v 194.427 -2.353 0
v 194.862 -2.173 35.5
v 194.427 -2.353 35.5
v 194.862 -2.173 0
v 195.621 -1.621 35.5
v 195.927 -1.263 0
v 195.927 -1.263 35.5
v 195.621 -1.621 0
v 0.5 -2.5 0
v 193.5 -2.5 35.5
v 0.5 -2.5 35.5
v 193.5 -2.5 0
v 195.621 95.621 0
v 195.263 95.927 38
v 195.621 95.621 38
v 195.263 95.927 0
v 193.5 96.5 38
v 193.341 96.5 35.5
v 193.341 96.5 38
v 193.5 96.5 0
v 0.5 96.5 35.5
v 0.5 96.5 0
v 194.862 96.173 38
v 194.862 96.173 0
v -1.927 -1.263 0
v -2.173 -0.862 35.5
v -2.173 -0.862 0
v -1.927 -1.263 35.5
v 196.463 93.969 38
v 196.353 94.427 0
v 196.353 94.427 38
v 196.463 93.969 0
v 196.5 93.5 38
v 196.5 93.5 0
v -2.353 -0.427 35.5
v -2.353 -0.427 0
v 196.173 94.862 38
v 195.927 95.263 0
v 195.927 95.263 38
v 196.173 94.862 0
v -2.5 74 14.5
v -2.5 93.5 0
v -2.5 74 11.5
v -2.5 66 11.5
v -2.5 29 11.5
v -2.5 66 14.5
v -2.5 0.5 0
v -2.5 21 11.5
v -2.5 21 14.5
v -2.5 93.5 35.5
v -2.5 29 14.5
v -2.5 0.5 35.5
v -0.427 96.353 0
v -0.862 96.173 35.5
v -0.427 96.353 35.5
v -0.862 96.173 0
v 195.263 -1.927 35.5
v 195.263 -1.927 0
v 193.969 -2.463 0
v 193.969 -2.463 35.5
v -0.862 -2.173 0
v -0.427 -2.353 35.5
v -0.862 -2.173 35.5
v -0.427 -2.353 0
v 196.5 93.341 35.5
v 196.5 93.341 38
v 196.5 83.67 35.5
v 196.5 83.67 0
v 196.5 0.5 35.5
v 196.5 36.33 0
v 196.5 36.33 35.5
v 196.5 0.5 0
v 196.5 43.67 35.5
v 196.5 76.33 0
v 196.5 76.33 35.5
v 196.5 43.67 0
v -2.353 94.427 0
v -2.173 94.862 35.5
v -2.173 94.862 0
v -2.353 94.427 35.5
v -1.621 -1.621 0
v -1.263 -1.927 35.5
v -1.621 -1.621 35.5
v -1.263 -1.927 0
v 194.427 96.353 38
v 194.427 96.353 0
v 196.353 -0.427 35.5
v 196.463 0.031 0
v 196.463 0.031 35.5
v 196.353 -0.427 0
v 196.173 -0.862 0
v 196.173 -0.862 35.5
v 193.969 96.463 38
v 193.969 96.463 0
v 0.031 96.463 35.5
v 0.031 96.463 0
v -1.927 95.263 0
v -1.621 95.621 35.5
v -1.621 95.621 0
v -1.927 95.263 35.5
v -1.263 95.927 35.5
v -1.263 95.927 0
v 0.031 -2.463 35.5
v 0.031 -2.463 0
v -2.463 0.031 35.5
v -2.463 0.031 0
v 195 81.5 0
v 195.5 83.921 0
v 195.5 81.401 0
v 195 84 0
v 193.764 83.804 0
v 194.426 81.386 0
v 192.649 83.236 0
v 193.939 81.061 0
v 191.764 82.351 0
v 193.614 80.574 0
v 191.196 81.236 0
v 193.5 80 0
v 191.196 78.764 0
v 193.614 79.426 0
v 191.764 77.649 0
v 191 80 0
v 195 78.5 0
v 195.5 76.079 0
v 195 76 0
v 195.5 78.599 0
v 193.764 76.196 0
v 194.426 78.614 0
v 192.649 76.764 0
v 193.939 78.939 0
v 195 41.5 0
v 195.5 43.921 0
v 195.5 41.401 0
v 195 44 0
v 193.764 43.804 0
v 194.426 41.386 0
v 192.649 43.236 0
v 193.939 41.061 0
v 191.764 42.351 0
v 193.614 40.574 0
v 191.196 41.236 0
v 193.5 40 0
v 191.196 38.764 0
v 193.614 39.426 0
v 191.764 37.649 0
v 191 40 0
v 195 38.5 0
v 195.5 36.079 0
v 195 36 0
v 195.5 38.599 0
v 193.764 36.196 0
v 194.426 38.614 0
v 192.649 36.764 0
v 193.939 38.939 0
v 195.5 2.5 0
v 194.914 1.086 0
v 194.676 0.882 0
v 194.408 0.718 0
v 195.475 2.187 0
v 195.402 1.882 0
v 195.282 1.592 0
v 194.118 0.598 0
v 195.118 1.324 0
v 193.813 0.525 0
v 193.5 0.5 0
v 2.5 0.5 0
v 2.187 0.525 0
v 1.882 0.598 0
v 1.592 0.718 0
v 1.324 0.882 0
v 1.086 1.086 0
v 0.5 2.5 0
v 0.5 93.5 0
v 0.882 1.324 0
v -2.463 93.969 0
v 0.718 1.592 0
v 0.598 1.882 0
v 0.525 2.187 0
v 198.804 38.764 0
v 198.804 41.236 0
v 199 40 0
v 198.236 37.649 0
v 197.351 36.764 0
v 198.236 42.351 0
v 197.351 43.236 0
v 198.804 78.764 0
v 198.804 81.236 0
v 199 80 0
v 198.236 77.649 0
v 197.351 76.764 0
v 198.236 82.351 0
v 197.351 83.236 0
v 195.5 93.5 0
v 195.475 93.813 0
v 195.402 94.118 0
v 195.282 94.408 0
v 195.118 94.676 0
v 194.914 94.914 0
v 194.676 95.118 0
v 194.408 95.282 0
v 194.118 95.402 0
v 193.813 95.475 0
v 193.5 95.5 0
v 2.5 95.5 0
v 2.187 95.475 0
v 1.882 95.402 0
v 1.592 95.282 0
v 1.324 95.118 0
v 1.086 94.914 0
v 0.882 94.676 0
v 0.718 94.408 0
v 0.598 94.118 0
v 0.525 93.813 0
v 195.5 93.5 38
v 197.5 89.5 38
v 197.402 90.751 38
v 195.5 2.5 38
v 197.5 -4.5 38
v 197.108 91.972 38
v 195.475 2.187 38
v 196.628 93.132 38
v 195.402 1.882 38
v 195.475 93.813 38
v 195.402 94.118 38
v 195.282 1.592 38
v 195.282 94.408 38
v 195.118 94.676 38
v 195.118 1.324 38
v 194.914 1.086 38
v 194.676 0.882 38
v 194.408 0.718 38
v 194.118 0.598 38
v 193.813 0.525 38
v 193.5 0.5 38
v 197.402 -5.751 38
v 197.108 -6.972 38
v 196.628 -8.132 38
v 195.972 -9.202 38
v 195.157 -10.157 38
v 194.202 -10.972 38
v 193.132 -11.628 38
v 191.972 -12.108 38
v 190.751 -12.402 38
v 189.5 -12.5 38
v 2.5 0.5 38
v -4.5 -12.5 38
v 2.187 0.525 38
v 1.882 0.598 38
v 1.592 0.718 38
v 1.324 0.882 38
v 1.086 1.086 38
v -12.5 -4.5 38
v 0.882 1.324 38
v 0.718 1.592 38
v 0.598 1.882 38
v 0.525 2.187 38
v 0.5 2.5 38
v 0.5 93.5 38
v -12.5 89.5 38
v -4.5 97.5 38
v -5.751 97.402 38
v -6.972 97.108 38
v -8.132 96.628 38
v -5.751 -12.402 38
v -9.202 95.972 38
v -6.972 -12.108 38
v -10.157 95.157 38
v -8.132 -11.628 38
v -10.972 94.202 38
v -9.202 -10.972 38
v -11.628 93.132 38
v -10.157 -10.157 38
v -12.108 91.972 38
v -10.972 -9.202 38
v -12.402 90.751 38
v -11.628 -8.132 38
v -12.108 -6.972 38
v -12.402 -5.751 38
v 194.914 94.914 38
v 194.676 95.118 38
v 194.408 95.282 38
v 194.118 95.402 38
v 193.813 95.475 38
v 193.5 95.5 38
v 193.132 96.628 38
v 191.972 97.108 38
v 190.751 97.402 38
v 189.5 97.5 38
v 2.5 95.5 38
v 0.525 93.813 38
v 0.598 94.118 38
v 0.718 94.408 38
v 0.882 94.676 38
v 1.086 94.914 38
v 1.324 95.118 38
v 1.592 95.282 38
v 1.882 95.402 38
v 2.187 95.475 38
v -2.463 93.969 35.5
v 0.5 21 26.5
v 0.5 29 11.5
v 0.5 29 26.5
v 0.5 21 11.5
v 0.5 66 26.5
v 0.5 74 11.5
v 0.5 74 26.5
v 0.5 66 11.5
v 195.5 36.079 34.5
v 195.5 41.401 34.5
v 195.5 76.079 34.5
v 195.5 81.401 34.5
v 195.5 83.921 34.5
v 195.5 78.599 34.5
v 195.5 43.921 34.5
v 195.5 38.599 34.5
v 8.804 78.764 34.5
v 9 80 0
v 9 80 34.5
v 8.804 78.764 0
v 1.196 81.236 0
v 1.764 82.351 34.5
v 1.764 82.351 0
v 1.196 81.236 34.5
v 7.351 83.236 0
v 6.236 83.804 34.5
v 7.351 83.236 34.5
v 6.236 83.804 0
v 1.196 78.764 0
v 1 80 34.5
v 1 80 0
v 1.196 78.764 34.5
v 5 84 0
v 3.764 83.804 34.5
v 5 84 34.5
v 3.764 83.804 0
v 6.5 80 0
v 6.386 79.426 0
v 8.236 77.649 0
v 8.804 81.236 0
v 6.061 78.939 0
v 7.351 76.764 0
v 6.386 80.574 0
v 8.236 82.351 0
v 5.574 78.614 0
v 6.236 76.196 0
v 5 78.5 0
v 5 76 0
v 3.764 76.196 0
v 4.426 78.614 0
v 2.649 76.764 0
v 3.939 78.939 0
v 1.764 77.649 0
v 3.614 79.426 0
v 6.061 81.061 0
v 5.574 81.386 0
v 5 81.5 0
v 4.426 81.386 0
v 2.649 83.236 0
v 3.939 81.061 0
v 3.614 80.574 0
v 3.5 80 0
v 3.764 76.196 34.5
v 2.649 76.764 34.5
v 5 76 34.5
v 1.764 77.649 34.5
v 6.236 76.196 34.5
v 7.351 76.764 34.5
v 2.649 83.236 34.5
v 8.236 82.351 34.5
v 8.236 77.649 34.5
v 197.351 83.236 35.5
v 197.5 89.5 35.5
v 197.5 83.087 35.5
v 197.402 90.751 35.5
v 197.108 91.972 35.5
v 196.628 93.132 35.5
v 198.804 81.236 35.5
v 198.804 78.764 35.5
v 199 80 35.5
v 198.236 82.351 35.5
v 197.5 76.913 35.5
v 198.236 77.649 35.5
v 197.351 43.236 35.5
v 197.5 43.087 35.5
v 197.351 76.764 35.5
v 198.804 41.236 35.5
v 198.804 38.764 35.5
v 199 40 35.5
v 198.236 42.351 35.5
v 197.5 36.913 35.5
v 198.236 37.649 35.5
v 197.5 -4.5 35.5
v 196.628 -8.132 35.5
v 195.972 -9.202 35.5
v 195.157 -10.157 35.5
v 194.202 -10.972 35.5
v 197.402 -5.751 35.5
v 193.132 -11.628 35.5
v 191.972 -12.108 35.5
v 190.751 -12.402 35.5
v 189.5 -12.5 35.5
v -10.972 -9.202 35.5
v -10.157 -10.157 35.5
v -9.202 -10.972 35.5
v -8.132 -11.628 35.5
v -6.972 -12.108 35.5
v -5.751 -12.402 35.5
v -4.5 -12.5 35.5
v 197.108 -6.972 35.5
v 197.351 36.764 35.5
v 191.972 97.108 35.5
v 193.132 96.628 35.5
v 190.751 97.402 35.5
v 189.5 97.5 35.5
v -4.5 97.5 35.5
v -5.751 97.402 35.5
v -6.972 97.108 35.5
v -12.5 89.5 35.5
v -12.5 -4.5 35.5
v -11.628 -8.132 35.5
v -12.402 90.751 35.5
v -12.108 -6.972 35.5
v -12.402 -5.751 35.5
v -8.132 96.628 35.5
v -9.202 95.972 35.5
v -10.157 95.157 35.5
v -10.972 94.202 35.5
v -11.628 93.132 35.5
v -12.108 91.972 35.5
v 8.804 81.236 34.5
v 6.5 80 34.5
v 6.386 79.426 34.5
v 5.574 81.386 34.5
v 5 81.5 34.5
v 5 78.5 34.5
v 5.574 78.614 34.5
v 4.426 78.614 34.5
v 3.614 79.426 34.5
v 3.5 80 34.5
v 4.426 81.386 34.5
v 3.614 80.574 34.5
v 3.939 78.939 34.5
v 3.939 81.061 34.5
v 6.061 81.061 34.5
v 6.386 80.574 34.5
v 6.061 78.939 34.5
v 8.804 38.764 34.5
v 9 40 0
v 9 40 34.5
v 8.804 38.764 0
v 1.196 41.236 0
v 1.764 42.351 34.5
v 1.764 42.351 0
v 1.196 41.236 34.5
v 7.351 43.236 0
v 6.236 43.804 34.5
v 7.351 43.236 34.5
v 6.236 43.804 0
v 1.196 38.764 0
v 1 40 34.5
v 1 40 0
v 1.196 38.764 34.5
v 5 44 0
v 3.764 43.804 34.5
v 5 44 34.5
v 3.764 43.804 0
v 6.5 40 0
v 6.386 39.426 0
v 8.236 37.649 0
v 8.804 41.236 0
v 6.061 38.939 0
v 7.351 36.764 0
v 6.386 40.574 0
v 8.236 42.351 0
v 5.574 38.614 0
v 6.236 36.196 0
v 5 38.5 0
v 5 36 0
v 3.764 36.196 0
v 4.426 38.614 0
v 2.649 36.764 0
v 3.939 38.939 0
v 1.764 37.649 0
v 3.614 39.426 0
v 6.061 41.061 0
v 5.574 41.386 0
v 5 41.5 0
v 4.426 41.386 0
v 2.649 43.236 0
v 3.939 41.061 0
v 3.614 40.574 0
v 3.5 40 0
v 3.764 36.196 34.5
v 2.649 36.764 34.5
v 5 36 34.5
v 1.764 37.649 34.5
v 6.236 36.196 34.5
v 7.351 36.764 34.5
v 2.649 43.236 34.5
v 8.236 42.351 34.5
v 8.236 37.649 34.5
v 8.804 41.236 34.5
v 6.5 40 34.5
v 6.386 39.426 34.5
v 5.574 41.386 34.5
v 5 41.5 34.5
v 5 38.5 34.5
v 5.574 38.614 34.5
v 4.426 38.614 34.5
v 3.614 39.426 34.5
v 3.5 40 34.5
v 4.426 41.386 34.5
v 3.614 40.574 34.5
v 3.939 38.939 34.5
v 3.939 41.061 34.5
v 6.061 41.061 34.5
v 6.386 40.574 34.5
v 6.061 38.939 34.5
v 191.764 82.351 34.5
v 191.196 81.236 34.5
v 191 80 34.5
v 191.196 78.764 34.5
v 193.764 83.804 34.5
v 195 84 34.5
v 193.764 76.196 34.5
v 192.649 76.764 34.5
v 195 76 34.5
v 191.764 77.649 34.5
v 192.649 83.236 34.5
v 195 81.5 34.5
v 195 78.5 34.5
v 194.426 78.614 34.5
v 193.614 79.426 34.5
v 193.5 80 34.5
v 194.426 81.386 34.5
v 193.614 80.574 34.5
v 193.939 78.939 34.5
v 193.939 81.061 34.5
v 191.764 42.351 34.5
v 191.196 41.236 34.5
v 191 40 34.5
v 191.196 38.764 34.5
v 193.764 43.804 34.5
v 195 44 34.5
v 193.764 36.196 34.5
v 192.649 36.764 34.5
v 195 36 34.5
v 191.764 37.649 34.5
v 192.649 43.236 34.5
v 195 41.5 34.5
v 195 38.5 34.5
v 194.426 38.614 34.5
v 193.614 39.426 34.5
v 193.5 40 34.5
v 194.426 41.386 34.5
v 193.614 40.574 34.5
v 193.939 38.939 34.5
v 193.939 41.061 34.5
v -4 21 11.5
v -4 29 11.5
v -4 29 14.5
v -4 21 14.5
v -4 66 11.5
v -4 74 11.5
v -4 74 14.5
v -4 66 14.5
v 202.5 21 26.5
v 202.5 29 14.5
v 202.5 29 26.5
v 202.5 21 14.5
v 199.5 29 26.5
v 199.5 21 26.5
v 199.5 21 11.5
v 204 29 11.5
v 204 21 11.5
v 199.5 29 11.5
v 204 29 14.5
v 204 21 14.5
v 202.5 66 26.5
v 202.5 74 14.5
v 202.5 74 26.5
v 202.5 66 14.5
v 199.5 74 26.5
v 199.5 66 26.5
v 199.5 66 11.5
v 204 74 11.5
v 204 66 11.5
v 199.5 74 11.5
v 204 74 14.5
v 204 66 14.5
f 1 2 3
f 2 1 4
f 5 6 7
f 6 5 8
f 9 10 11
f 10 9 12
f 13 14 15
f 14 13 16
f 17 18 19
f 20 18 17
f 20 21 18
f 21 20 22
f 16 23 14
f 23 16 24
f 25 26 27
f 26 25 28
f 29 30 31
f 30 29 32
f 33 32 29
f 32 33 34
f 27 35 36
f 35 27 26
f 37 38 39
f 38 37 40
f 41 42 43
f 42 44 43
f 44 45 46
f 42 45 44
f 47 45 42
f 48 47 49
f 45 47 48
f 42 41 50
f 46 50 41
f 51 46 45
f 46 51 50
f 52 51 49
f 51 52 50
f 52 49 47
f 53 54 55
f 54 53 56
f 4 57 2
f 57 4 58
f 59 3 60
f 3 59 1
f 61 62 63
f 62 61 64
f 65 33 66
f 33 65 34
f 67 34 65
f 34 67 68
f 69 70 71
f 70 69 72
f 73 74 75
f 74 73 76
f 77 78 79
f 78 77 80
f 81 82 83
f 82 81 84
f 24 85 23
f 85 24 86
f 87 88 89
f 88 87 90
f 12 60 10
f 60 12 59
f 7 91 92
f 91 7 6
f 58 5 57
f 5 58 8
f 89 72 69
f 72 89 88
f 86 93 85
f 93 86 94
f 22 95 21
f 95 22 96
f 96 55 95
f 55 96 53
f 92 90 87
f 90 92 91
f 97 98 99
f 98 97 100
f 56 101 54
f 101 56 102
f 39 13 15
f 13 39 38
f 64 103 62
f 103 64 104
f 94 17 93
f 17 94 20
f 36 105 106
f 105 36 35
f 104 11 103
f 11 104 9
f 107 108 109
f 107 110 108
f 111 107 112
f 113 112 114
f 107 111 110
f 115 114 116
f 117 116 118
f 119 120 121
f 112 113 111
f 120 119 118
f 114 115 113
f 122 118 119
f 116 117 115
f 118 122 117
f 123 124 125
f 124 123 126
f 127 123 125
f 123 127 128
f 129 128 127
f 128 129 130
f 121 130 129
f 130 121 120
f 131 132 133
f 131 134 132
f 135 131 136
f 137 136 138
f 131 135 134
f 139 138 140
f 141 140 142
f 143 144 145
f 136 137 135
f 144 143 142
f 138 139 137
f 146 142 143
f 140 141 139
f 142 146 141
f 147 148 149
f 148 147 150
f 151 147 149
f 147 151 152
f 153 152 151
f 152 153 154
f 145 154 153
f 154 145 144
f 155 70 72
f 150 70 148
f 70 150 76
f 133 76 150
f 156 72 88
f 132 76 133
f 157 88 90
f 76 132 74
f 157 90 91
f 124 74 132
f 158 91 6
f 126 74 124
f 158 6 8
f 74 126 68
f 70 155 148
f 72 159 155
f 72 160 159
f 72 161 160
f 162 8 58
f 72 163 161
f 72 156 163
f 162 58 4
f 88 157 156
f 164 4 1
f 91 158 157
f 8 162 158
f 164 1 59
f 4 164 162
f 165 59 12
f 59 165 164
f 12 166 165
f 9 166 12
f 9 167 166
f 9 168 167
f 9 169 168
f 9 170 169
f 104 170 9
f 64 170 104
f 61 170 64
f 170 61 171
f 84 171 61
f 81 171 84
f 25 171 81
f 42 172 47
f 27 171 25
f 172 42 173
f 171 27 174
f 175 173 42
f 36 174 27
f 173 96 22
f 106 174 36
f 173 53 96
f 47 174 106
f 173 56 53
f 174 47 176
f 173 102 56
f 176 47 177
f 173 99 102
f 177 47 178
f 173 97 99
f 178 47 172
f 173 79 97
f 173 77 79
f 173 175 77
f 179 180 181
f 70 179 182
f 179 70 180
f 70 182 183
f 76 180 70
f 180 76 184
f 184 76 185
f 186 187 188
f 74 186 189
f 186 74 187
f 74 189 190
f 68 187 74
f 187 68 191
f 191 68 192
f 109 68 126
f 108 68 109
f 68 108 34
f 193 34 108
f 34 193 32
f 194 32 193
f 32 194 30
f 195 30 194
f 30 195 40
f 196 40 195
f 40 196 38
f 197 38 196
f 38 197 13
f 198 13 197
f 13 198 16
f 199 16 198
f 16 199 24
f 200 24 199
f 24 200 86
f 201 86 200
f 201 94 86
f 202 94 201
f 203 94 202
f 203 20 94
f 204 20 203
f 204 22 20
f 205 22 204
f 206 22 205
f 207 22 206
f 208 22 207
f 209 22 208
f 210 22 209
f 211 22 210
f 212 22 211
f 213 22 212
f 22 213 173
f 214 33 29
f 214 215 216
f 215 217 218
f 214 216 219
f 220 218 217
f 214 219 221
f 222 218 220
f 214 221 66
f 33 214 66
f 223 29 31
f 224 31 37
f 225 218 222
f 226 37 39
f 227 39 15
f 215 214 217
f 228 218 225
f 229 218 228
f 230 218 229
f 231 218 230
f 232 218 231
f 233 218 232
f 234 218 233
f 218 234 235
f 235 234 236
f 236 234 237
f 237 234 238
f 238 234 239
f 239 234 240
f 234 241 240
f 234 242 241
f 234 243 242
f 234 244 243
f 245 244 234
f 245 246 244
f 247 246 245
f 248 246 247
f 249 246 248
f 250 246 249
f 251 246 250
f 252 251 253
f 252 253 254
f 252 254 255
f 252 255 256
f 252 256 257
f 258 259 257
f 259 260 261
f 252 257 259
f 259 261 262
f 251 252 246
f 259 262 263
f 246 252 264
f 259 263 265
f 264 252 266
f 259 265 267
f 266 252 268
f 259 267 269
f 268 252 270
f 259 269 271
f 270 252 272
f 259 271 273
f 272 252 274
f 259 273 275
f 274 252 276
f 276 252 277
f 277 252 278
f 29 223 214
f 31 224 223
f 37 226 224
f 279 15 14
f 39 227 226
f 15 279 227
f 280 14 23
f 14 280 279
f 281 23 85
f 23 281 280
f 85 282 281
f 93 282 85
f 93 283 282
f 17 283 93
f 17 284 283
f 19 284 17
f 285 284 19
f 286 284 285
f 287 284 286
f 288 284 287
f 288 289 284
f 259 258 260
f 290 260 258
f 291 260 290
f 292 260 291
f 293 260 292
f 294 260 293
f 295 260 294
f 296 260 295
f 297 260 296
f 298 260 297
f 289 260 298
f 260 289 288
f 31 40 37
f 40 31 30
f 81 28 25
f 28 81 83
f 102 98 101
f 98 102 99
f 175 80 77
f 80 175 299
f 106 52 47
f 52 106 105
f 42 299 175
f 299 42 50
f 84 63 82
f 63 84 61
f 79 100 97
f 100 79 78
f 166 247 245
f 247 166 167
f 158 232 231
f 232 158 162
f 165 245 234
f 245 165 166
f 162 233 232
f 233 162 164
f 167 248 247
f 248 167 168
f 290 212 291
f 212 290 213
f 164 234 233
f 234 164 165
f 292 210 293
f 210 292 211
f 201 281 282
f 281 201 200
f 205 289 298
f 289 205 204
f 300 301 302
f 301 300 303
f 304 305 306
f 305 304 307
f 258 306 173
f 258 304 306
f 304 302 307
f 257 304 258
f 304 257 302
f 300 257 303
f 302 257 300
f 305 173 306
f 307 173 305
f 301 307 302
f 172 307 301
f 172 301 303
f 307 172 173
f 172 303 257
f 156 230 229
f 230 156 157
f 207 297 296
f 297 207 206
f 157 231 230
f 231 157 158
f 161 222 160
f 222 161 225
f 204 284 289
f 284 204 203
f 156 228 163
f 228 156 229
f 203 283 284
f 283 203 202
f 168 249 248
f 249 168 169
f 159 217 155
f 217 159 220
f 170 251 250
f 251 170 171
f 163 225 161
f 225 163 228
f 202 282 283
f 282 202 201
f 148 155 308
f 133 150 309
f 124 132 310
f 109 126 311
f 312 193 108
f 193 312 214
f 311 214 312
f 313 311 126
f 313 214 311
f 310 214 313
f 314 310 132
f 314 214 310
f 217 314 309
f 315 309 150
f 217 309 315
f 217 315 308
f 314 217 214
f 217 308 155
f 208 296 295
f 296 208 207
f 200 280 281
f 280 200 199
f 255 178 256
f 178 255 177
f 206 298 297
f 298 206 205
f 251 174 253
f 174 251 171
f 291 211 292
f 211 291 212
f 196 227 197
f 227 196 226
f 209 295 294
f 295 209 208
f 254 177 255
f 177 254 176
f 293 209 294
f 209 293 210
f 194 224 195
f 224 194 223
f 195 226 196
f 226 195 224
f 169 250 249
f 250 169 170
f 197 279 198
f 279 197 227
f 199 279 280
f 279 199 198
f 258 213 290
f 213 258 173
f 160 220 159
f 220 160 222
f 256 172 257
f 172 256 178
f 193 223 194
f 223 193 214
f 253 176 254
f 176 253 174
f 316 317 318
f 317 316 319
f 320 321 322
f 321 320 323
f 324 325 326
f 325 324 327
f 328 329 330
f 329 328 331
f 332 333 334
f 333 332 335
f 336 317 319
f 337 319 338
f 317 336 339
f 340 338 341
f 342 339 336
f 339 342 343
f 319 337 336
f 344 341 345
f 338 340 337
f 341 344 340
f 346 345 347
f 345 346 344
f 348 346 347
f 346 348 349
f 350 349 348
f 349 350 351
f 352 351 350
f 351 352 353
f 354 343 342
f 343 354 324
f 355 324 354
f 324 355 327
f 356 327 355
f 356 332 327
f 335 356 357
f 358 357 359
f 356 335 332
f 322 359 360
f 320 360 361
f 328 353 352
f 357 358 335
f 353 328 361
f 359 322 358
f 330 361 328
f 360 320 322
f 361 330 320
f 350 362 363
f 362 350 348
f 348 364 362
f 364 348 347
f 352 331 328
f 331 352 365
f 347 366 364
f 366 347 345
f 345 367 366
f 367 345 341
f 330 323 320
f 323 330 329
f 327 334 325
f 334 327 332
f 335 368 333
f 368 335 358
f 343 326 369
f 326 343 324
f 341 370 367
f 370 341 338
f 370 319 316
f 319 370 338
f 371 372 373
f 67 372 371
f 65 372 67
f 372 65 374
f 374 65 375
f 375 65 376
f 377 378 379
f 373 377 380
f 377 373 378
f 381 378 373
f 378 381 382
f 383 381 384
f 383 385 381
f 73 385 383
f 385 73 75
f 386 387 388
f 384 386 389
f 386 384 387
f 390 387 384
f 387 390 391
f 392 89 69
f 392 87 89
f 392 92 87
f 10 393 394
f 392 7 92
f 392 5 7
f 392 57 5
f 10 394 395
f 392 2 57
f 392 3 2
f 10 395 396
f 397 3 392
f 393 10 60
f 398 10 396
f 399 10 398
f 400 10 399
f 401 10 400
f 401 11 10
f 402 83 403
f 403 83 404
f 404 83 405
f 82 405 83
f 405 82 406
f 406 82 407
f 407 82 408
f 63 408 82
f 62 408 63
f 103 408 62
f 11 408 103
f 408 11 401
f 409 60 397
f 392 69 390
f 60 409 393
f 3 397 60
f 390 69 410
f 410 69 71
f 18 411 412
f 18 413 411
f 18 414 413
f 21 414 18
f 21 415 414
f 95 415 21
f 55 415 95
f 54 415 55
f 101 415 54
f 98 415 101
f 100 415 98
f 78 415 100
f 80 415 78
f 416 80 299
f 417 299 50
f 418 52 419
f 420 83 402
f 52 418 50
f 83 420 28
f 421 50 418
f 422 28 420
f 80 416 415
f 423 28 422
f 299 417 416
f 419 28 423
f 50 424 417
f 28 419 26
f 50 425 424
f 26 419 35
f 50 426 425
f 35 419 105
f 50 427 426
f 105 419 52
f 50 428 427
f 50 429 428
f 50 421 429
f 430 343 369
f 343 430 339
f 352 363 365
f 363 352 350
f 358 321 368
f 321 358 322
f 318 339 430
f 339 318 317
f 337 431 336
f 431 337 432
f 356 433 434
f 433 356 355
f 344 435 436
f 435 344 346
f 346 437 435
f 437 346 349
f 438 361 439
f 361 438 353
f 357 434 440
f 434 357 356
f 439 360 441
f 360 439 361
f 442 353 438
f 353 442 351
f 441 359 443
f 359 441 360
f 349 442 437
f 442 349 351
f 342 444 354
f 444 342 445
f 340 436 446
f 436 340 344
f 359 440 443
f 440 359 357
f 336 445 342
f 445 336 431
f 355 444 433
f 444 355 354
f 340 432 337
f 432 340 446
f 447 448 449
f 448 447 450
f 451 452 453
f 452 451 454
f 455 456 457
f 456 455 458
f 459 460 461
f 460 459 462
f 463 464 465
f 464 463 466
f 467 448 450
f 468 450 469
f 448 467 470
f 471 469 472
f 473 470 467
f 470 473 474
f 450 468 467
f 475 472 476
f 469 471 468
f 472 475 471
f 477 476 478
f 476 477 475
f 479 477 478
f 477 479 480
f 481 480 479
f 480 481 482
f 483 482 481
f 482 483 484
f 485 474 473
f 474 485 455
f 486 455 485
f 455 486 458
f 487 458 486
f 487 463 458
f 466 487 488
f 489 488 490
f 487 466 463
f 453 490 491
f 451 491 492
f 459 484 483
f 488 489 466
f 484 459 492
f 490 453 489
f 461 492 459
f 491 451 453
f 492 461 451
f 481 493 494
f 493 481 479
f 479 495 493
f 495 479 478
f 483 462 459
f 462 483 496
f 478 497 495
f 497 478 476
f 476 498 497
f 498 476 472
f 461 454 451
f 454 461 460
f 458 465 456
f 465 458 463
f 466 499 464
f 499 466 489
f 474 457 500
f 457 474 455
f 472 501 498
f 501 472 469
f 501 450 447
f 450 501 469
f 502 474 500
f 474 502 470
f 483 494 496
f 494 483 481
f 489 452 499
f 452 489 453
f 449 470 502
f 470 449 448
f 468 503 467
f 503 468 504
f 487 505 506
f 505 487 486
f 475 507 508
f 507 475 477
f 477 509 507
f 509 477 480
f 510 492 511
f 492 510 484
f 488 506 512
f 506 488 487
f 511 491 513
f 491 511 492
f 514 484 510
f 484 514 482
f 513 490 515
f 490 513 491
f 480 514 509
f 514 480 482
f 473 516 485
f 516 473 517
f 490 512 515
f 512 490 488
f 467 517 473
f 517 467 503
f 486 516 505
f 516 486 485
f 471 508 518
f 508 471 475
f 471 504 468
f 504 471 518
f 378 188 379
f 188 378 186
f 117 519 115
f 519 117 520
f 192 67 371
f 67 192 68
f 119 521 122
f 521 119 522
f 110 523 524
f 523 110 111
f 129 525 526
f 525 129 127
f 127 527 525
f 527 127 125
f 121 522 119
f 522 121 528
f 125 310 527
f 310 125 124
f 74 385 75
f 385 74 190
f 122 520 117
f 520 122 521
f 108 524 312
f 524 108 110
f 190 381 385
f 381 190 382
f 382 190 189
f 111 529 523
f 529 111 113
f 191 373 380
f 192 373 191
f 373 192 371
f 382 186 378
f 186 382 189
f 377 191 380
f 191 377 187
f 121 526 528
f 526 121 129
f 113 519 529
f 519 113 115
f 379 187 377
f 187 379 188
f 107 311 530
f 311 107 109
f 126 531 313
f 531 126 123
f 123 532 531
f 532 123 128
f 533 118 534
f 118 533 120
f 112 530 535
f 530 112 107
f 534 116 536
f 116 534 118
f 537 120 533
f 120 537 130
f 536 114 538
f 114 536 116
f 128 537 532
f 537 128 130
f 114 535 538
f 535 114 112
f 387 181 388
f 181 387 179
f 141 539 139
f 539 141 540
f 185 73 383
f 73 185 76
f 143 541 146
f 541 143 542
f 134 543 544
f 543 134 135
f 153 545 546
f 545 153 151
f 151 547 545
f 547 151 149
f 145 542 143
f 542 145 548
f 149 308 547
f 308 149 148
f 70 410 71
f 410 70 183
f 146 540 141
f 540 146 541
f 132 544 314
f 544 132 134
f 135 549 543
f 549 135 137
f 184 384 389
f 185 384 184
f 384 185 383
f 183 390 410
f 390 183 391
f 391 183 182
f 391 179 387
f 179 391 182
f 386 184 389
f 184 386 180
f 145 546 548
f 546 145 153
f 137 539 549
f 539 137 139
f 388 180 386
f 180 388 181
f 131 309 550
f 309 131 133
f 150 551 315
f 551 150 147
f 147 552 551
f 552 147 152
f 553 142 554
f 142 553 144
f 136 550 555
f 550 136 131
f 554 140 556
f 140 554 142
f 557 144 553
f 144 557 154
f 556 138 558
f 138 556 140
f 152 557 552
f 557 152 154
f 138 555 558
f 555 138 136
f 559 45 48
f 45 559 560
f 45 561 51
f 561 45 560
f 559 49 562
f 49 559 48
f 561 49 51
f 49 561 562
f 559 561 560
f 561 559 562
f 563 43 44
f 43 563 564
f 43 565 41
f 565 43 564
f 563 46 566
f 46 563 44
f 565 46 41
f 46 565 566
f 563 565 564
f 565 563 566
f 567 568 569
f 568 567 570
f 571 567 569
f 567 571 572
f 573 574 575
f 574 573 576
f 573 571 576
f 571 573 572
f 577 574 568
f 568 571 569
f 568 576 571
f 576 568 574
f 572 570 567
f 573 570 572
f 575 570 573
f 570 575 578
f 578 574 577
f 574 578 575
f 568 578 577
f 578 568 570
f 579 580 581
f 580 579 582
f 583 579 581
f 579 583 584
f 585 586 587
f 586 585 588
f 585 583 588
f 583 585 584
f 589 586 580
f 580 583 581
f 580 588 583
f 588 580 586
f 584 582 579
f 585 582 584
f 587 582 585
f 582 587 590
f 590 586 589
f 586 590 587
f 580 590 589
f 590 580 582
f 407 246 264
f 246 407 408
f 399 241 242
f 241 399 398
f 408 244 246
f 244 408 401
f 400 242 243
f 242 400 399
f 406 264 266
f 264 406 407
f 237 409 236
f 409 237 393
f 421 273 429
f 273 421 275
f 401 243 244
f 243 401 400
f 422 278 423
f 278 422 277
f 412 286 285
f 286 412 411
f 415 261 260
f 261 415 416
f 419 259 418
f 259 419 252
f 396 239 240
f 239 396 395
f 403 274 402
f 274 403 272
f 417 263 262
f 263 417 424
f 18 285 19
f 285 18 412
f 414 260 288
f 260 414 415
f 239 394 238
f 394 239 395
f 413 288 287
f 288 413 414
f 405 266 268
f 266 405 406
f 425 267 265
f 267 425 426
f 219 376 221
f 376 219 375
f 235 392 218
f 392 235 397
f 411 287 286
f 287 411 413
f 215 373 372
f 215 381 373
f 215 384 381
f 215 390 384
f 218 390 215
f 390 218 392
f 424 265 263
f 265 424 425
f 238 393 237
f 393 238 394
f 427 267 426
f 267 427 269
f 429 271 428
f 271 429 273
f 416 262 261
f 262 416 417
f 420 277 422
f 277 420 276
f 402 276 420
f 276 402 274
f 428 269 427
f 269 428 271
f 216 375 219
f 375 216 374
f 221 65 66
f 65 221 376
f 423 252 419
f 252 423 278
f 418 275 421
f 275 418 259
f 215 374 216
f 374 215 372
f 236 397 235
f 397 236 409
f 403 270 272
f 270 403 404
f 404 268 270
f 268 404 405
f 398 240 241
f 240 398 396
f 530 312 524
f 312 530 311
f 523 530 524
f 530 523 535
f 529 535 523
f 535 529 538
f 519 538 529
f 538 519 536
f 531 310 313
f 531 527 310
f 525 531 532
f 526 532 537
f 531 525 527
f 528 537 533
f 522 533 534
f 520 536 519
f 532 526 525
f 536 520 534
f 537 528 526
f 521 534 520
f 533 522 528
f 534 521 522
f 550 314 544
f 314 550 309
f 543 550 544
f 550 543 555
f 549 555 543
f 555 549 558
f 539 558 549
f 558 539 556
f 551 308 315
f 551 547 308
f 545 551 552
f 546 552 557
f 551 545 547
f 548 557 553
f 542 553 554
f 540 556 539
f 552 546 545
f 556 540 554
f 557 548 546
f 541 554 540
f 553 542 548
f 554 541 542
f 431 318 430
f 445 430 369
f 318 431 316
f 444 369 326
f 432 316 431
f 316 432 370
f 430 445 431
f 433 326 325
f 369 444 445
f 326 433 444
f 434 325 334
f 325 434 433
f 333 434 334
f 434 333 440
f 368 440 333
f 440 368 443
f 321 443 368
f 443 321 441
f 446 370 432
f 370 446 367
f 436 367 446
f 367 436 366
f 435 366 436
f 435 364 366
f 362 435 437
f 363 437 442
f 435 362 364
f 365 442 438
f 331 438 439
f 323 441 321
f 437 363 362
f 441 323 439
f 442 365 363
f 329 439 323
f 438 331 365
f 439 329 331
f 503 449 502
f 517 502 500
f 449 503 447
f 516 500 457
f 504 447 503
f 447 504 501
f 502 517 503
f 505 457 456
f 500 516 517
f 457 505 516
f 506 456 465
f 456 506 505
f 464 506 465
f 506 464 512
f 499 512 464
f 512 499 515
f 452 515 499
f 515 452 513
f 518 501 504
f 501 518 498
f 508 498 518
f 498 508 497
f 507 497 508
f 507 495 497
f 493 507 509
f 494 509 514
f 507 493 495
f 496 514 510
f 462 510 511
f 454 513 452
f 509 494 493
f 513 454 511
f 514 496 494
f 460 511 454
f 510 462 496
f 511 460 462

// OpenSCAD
// Prado 2018 Radio Trim — Sony XAV-AX8500 in Toyota 200mm Opening
// v1.0 — 2026-03-09
//
// OEM: Eclipse AVN-R8W (205.5 × 104 × 165mm, Toyota 200mm wide format)
// New: Sony XAV-AX8500 (178 × 50mm DIN chassis, 269 × 167mm floating screen)
// Dash opening: ~200 × 100mm (Toyota 200mm wide standard)

// ── Parameters (all in mm) ────────────────────────────────────

// Dash opening (outer dimensions of trim)
dash_w = 200;       // Toyota 200mm wide opening
dash_h = 100;       // Double DIN height
corner_r = 3;       // Corner radius of dash opening

// Sony DIN chassis cutout
din_w = 178;         // Sony chassis width
din_h = 50;          // Sony chassis height (single DIN)
din_corner_r = 2;    // DIN cutout corner radius

// DIN position within the opening
// From photos: cage is mounted toward the top of the opening
// 15mm from top edge, leaving ~35mm gap below
din_offset_top = 15;     // gap from top of trim to top of DIN cutout
din_offset_left = (dash_w - din_w) / 2;  // centered horizontally = 11mm

// Depth
trim_depth = 38;     // 3.8cm from dash face to DIN cage (from measurement)
flange_depth = 3;    // front lip that sits against dash face

// Front flange (lip that overlaps the dash opening edge)
flange_overhang = 5; // how far the lip extends beyond the opening on each side
flange_w = dash_w + flange_overhang * 2;
flange_h = dash_h + flange_overhang * 2;
flange_thickness = 2.5; // thickness of the front lip

// Wall thickness
wall = 2.5;

// Tolerances
tol = 0.5;           // gap for press fit into dash opening

// ── Modules ───────────────────────────────────────────────────

module rounded_rect(w, h, r) {
    offset(r) square([w - 2*r, h - 2*r], center=false);
}

module trim_body() {
    // Main body — outer shell that fits into the dash opening
    difference() {
        // Outer block (dash opening size - tolerance)
        translate([tol, tol, 0])
        linear_extrude(trim_depth)
            rounded_rect(dash_w - tol*2, dash_h - tol*2, corner_r);

        // Hollow out the inside (leave walls)
        translate([wall, wall, -1])
        linear_extrude(trim_depth + 2)
            rounded_rect(dash_w - wall*2, dash_h - wall*2, corner_r - 1);
    }
}

module din_cutout() {
    // Cut the DIN slot through the back wall
    translate([din_offset_left, dash_h - din_offset_top - din_h, -1])
    linear_extrude(trim_depth + 2)
        rounded_rect(din_w, din_h, din_corner_r);
}

module front_flange() {
    // Front lip/flange that sits flush against dash face and prevents trim from falling in
    translate([-(flange_overhang - tol), -(flange_overhang - tol), trim_depth - flange_thickness])
    linear_extrude(flange_thickness)
        rounded_rect(flange_w, flange_h, corner_r + flange_overhang);
}

module flange_cutout() {
    // Cut opening in flange matching the outer wall opening
    // (so it's a frame, not a solid plate)
    translate([wall, wall, trim_depth - flange_thickness - 1])
    linear_extrude(flange_thickness + 2)
        rounded_rect(dash_w - wall*2, dash_h - wall*2, corner_r - 1);
}

module screw_posts() {
    // Screw mounting posts — align with DIN cage screw holes
    // Two posts on each side of the DIN cutout
    post_r = 4;
    hole_r = 1.5;  // M3 screw

    positions = [
        // Left side posts
        [din_offset_left - post_r - 2, dash_h - din_offset_top - 5],
        [din_offset_left - post_r - 2, dash_h - din_offset_top - din_h + 5],
        // Right side posts
        [din_offset_left + din_w + post_r + 2, dash_h - din_offset_top - 5],
        [din_offset_left + din_w + post_r + 2, dash_h - din_offset_top - din_h + 5],
    ];

    for (pos = positions) {
        difference() {
            translate([pos[0], pos[1], 0])
            linear_extrude(trim_depth - flange_thickness)
                circle(post_r, $fn=20);

            translate([pos[0], pos[1], -1])
            linear_extrude(trim_depth + 2)
                circle(hole_r, $fn=16);
        }
    }
}

module clip_tabs() {
    // Snap-fit clip tabs on sides to engage with Toyota dash clips
    clip_w = 8;
    clip_h = 3;
    clip_depth = 15;
    clip_hook = 1.5;

    // Left side clips (2)
    for (y_pos = [25, 70]) {
        // Clip arm
        translate([-clip_h + tol, y_pos - clip_w/2, trim_depth/2 - clip_depth/2])
        cube([clip_h, clip_w, clip_depth]);

        // Hook at the end
        translate([-clip_h - clip_hook + tol, y_pos - clip_w/2, trim_depth/2 - clip_depth/2])
        cube([clip_hook, clip_w, 3]);
    }

    // Right side clips (2)
    for (y_pos = [25, 70]) {
        translate([dash_w - tol, y_pos - clip_w/2, trim_depth/2 - clip_depth/2])
        cube([clip_h, clip_w, clip_depth]);

        translate([dash_w + clip_h - tol, y_pos - clip_w/2, trim_depth/2 - clip_depth/2])
        cube([clip_hook, clip_w, 3]);
    }
}

// ── Assembly ──────────────────────────────────────────────────

$fn = 40;

difference() {
    union() {
        trim_body();
        front_flange();
        screw_posts();
        clip_tabs();
    }

    // Cut the DIN opening through everything
    din_cutout();

    // Cut the flange center out (make it a frame)
    flange_cutout();
}
